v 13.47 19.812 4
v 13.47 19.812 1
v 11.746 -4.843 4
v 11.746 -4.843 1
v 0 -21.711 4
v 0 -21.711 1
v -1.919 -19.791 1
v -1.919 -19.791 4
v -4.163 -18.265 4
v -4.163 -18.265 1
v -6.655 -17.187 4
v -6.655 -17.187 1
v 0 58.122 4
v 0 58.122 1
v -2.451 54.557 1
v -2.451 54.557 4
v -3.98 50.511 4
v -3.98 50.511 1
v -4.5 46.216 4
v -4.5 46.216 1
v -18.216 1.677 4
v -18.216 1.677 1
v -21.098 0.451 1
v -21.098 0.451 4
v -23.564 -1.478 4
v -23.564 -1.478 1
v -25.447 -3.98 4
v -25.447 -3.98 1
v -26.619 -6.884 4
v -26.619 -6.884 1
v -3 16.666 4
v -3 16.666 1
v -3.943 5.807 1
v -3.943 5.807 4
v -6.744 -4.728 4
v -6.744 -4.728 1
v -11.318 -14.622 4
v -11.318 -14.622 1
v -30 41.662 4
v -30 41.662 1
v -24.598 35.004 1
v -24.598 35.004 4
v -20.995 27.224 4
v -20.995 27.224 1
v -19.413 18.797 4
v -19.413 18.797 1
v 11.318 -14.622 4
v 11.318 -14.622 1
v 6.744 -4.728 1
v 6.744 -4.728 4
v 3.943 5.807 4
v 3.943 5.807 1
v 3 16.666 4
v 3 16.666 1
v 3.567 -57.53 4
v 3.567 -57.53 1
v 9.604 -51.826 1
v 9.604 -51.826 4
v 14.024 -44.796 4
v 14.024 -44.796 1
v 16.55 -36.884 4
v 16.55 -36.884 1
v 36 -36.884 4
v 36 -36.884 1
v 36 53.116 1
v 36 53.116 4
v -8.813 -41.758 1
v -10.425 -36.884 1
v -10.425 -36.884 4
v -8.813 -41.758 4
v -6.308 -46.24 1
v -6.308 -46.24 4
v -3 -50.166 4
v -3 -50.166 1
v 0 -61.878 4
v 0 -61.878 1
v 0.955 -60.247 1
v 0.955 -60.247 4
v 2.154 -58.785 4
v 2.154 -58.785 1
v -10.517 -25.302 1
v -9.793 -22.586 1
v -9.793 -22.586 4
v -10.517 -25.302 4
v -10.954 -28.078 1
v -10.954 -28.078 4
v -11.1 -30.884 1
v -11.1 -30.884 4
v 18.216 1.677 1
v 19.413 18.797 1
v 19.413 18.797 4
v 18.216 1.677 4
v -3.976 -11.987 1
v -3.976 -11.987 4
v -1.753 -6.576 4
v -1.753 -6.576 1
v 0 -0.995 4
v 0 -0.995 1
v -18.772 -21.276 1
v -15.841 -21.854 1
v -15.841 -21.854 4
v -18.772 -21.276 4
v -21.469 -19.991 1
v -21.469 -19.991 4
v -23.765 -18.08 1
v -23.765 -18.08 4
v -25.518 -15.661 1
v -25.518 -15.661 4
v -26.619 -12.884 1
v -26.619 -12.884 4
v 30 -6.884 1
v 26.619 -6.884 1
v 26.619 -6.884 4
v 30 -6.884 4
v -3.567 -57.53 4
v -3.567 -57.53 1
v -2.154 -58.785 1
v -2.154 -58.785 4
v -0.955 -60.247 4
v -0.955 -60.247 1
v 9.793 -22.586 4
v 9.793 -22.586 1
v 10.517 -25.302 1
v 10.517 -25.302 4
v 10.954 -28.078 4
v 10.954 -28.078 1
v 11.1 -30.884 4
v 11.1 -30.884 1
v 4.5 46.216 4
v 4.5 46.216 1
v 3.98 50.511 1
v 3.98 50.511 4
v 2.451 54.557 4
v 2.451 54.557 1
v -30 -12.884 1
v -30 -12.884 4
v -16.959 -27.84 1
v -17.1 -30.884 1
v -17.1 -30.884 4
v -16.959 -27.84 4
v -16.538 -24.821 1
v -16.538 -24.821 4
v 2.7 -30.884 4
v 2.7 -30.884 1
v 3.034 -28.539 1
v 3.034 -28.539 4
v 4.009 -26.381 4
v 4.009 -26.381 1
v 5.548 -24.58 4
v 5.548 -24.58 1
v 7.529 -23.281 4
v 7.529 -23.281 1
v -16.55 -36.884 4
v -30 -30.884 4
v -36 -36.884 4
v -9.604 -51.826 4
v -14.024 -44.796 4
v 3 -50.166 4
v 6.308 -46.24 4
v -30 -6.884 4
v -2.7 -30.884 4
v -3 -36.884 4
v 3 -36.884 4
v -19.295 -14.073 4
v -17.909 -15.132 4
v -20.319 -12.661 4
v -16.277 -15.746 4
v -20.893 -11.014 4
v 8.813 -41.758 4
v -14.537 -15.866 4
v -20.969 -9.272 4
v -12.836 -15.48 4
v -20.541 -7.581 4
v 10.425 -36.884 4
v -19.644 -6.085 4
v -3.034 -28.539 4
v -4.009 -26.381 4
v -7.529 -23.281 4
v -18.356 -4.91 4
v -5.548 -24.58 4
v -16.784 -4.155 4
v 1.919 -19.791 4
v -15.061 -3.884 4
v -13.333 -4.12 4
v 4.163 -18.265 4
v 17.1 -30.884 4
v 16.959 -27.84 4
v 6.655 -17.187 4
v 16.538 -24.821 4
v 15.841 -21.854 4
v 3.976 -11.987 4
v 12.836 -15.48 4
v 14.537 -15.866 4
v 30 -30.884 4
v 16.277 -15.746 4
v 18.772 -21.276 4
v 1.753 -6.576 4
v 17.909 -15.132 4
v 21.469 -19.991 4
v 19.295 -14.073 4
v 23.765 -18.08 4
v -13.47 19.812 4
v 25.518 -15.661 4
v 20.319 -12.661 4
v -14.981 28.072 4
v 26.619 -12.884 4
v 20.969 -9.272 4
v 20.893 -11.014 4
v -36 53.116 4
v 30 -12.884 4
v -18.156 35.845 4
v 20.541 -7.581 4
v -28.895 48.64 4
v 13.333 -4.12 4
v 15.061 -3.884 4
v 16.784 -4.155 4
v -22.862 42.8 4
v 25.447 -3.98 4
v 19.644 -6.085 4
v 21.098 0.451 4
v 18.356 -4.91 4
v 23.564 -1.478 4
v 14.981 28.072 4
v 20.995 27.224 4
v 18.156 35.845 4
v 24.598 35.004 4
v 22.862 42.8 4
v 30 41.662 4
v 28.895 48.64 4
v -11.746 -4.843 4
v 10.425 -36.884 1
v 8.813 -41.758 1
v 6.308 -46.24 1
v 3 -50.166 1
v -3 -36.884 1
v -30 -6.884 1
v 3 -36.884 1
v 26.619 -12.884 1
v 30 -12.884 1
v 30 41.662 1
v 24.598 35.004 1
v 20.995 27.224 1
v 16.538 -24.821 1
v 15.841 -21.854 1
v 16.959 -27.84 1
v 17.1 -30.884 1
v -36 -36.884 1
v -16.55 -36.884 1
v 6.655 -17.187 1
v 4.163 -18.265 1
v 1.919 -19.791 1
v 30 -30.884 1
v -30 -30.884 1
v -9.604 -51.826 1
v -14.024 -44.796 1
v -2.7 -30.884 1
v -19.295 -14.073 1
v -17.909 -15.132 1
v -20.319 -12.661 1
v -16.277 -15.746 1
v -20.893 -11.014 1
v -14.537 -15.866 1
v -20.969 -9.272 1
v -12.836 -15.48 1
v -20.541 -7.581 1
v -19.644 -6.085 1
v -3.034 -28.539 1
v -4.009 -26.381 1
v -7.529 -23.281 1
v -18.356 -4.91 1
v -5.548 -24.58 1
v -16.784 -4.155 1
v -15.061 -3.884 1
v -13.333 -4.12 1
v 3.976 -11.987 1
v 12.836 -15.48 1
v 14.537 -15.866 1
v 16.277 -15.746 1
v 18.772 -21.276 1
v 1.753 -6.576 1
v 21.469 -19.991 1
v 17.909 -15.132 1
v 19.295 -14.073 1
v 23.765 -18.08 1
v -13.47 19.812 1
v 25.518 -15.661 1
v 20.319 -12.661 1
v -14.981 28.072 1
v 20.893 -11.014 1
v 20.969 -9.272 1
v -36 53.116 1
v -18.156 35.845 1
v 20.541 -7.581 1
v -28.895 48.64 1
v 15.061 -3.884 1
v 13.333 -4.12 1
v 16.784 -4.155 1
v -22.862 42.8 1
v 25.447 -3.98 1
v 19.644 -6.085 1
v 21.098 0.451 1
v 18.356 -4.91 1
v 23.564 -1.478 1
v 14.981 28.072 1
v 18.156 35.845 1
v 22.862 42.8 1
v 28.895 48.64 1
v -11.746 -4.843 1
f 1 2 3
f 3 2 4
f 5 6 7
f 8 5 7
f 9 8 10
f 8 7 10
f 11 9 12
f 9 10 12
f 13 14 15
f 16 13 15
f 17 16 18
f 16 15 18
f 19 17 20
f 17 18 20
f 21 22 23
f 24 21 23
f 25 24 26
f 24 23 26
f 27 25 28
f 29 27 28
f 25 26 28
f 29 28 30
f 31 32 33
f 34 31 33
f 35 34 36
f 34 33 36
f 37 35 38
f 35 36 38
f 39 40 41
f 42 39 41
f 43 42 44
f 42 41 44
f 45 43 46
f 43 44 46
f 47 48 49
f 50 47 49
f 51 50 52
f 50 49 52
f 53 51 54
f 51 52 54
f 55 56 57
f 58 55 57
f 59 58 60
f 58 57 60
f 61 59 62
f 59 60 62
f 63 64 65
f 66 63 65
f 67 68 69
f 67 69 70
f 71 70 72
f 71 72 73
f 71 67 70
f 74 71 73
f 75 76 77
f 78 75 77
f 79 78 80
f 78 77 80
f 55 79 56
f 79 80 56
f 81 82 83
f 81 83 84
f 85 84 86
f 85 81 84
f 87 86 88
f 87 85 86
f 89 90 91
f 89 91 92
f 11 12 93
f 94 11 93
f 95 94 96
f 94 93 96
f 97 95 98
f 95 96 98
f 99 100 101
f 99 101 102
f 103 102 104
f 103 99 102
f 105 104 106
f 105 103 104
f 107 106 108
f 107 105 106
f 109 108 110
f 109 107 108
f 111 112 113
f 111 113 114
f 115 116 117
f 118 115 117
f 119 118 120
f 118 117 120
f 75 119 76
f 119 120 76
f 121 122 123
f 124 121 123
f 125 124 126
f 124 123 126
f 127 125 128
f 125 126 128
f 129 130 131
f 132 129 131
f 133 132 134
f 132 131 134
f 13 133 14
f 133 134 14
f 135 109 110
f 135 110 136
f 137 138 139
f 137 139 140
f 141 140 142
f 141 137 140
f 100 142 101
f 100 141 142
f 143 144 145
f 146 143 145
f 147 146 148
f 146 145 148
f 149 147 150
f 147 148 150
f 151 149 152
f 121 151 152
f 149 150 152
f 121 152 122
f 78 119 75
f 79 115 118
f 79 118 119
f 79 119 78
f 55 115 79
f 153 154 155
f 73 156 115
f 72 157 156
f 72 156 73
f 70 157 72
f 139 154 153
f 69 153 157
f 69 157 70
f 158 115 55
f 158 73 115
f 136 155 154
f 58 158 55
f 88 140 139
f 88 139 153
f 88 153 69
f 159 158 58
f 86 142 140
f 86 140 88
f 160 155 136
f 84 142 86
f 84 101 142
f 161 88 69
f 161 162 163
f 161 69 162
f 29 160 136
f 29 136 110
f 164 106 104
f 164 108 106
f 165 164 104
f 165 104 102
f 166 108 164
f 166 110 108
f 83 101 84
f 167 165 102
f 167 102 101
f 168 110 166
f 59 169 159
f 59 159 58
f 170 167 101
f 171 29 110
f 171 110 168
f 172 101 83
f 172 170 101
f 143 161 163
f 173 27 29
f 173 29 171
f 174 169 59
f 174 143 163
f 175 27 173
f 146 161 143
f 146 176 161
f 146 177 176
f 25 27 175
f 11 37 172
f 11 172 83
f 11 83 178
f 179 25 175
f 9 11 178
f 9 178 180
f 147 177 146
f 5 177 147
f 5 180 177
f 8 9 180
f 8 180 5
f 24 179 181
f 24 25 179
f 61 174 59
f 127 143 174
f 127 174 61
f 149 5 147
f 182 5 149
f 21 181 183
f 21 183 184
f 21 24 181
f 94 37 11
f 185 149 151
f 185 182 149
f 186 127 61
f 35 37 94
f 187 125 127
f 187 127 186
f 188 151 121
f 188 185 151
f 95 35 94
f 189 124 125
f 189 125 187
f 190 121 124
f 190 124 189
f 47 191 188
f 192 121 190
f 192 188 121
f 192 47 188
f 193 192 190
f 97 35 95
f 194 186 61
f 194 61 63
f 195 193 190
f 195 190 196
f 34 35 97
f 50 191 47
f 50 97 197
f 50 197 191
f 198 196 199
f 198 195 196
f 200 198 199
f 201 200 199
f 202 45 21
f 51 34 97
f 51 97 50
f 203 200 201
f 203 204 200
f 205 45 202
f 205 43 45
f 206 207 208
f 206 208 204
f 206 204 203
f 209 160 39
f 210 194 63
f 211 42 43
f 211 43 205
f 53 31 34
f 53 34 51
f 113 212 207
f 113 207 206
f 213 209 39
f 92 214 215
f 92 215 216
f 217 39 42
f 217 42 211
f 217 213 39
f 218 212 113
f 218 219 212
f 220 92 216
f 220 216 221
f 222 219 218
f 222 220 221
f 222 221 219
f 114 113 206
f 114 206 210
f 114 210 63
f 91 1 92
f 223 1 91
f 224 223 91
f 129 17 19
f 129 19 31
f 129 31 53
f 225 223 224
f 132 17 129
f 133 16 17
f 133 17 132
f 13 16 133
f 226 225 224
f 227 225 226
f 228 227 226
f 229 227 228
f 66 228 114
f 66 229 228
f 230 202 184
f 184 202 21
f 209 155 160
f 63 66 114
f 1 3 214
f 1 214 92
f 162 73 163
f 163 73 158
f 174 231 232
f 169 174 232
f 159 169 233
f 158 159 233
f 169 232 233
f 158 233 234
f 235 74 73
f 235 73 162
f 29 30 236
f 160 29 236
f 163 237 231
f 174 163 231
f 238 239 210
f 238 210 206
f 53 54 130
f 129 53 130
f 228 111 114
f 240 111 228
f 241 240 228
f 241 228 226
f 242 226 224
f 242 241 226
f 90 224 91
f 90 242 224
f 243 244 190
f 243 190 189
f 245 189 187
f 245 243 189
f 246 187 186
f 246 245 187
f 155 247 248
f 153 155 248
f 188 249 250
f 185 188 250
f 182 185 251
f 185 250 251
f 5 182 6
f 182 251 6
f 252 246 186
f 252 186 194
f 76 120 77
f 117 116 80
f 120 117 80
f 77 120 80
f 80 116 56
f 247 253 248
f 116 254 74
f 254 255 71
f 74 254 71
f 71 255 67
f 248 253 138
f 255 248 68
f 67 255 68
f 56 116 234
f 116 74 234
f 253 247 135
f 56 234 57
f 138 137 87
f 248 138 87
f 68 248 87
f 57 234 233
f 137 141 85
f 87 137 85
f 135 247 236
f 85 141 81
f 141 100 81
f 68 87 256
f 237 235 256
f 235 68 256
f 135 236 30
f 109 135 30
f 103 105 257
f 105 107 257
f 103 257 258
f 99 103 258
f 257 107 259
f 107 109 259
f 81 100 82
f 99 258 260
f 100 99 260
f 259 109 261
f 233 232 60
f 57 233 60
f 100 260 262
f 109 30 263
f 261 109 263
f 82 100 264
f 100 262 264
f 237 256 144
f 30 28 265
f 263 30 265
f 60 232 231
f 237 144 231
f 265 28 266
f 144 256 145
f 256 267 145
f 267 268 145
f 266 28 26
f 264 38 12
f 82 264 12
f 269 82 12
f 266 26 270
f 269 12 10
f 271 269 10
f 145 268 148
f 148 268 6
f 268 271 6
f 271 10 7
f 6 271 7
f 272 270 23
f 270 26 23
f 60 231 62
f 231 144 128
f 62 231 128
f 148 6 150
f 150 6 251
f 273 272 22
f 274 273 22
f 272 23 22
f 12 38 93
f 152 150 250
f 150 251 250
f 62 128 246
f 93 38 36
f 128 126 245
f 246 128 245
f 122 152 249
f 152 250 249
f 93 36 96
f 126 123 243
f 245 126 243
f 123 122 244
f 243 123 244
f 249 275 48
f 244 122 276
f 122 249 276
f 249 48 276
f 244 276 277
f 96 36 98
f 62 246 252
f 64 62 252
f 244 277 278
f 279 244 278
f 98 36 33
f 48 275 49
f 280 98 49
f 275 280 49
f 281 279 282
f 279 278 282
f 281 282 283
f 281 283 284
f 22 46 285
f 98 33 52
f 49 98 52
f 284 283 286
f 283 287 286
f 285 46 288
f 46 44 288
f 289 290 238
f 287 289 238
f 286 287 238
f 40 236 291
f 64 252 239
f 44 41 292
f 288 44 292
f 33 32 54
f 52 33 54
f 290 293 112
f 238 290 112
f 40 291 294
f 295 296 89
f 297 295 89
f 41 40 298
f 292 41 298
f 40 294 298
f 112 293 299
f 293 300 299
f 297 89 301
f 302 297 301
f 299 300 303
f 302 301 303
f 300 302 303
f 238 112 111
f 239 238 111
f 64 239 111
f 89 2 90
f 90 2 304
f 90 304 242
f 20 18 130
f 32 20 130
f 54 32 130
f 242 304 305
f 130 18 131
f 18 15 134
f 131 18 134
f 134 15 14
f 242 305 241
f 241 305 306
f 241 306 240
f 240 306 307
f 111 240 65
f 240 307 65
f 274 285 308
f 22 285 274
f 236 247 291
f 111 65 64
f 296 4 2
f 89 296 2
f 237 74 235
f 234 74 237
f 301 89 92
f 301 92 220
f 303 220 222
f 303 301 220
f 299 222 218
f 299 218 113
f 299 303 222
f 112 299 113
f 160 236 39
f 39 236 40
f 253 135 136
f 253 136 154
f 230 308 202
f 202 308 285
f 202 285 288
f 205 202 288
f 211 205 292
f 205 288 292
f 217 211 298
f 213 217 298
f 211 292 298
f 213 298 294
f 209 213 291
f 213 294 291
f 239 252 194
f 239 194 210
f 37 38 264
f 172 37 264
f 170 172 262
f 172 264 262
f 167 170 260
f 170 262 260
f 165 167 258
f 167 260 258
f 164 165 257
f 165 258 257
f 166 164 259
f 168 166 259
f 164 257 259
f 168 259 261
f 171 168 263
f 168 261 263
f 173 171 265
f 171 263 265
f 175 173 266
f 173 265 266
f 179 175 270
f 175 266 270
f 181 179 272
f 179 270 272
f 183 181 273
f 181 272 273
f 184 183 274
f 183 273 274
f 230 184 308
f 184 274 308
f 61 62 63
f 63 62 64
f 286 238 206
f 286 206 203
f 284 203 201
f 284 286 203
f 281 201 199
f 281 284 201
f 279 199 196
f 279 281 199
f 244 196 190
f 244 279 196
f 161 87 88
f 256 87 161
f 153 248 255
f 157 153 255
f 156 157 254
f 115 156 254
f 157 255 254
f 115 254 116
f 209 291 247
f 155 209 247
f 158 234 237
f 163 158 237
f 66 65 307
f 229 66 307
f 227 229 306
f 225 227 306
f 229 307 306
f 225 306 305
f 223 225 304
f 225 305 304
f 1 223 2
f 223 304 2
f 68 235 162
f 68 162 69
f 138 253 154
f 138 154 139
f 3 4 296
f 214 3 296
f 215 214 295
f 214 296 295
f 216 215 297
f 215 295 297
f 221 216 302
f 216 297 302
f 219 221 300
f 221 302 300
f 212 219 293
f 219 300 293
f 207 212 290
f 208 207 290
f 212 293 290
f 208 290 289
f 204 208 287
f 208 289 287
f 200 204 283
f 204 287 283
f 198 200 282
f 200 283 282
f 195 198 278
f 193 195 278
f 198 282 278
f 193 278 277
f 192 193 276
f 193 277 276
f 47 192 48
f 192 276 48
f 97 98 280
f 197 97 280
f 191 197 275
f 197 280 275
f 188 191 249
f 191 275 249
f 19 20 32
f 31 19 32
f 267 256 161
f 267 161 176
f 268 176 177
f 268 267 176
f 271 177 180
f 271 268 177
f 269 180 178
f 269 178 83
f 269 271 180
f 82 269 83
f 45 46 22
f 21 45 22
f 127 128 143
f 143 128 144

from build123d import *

# Parameters (mm, degrees)
EXTRUDE_1_DEPTH = 5
SCALE_1_SCALE   = 0.6


with BuildPart() as part:
    # Эскиз1 → Бобышка-Вытянуть1 (new body)
    with BuildSketch(Plane.XY):
        with BuildLine():
            Line((5, 29.434281034), (7.5, 78.684281034))
            ThreePointArc((7.5, 78.684281034), (5.562430401, 89.290882752), (0, 98.527415867))
            ThreePointArc((0, 98.527415867), (-5.562430401, 89.290882752), (-7.5, 78.684281034))
            Line((-7.5, 78.684281034), (-5, 29.434281034))
            ThreePointArc((-5, 29.434281034), (-8.525159088, 2.45546227), (-18.863936417, -22.711839767))
            ThreePointArc((-18.863936417, -22.711839767), (-34.990467135, -15.25225811), (-19.576058944, -6.414477187))
            Line((-19.576058944, -6.414477187), (-22.449472465, 34.677250594))
            ThreePointArc((-22.449472465, 34.677250594), (-33.881518529, 67.398455427), (-60, 90.184281034))
            Line((-60, 90.184281034), (-60, -59.815718966))
            Line((-60, -59.815718966), (-27.583269132, -59.815718966))
            ThreePointArc((-27.583269132, -59.815718966), (-20.06001769, -79.093095091), (-5.945767968, -94.225989636))
            ThreePointArc((-5.945767968, -94.225989636), (-2.542345747, -97.496033993), (0, -101.472584133))
            ThreePointArc((0, -101.472584133), (2.542345747, -97.496033993), (5.945767968, -94.225989636))
            ThreePointArc((5.945767968, -94.225989636), (20.06001769, -79.093095091), (27.583269132, -59.815718966))
            Line((27.583269132, -59.815718966), (60, -59.815718966))
            Line((60, -59.815718966), (60, 90.184281034))
            ThreePointArc((60, 90.184281034), (33.881518529, 67.398455427), (22.449472466, 34.677250594))
            Line((22.449472466, 34.677250594), (19.576058945, -6.414477187))
            ThreePointArc((19.576058945, -6.414477187), (34.990467135, -15.25225811), (18.863936417, -22.711839767))
            ThreePointArc((18.863936417, -22.711839767), (8.525159088, 2.45546227), (5, 29.434281034))
        make_face()
        with BuildLine():
            Line((18.5, -49.815718966), (4.5, -49.815718966))
            ThreePointArc((4.5, -49.815718966), (7.858362699, -40.718710911), (16.322222222, -35.986138931))
            ThreePointArc((16.322222222, -35.986138931), (17.952221542, -42.815718966), (18.5, -49.815718966))
        make_face(mode=Mode.SUBTRACT)
        with BuildLine():
            Line((5, -59.815718966), (17.374821937, -59.815718966))
            ThreePointArc((17.374821937, -59.815718966), (12.779082294, -71.773717375), (5, -81.952146894))
            Line((5, -81.952146894), (5, -59.815718966))
        make_face(mode=Mode.SUBTRACT)
        with BuildLine():
            Line((28.5, -49.815718966), (50, -49.815718966))
            Line((50, -49.815718966), (50, -19.815718966))
            Line((50, -19.815718966), (44.364916731, -19.815718966))
            ThreePointArc((44.364916731, -19.815718966), (37.794087282, -30.18814007), (26.401072965, -34.766583472))
            ThreePointArc((26.401072965, -34.766583472), (27.972740949, -42.218318526), (28.5, -49.815718966))
        make_face(mode=Mode.SUBTRACT)
        with BuildLine():
            Line((44.364916731, -9.815718966), (50, -9.815718966))
            Line((50, -9.815718966), (50, 71.093478113))
            ThreePointArc((50, 71.093478113), (37.591425702, 53.700101468), (32.355603325, 32.985651651))
            Line((32.355603325, 32.985651651), (30.360374841, 4.452554998))
            ThreePointArc((30.360374841, 4.452554998), (39.273434111, -0.806112309), (44.364916731, -9.815718966))
        make_face(mode=Mode.SUBTRACT)
        with BuildLine():
            Line((-44.364916731, -19.815718966), (-50, -19.815718966))
            Line((-50, -19.815718966), (-50, -49.815718966))
            Line((-50, -49.815718966), (-28.5, -49.815718966))
            ThreePointArc((-28.5, -49.815718966), (-27.972740949, -42.218318526), (-26.401072965, -34.766583472))
            ThreePointArc((-26.401072965, -34.766583472), (-37.794087282, -30.18814007), (-44.364916731, -19.815718966))
        make_face(mode=Mode.SUBTRACT)
        with BuildLine():
            Line((-5, -81.952146894), (-5, -59.815718966))
            Line((-5, -59.815718966), (-17.374821937, -59.815718966))
            ThreePointArc((-17.374821937, -59.815718966), (-12.779082294, -71.773717375), (-5, -81.952146894))
        make_face(mode=Mode.SUBTRACT)
        with BuildLine():
            Line((-50, -9.815718966), (-50, 71.093478113))
            ThreePointArc((-50, 71.093478113), (-37.591425702, 53.700101468), (-32.355603325, 32.985651651))
            Line((-32.355603325, 32.985651651), (-30.360374841, 4.452554998))
            ThreePointArc((-30.360374841, 4.452554998), (-39.273434111, -0.806112309), (-44.364916731, -9.815718966))
            Line((-44.364916731, -9.815718966), (-50, -9.815718966))
        make_face(mode=Mode.SUBTRACT)
        with BuildLine():
            Line((-18.5, -49.815718966), (-4.5, -49.815718966))
            ThreePointArc((-4.5, -49.815718966), (-7.858362699, -40.718710911), (-16.322222222, -35.986138931))
            ThreePointArc((-16.322222222, -35.986138931), (-17.952221542, -42.815718966), (-18.5, -49.815718966))
        make_face(mode=Mode.SUBTRACT)
        with BuildLine():
            ThreePointArc((11.091351129, -26.987842983), (5.008387109, -29.966880672), (0, -34.526834114))
            ThreePointArc((0, -34.526834114), (-5.008387109, -29.966880672), (-11.091351129, -26.987842983))
            ThreePointArc((-11.091351129, -26.987842983), (-4.677676581, -13.850648093), (0, 0))
            ThreePointArc((0, 0), (4.677676581, -13.850648093), (11.091351129, -26.987842983))
        make_face(mode=Mode.SUBTRACT)
    extrude(amount=EXTRUDE_1_DEPTH)


with BuildPart() as part_1:
    # Масштаб1: scaled about (0, -2.486348983, 2.5)
    add(part.part.scale(SCALE_1_SCALE).moved(Location((0, -0.994539593, 1))))


solid = part_1.part
